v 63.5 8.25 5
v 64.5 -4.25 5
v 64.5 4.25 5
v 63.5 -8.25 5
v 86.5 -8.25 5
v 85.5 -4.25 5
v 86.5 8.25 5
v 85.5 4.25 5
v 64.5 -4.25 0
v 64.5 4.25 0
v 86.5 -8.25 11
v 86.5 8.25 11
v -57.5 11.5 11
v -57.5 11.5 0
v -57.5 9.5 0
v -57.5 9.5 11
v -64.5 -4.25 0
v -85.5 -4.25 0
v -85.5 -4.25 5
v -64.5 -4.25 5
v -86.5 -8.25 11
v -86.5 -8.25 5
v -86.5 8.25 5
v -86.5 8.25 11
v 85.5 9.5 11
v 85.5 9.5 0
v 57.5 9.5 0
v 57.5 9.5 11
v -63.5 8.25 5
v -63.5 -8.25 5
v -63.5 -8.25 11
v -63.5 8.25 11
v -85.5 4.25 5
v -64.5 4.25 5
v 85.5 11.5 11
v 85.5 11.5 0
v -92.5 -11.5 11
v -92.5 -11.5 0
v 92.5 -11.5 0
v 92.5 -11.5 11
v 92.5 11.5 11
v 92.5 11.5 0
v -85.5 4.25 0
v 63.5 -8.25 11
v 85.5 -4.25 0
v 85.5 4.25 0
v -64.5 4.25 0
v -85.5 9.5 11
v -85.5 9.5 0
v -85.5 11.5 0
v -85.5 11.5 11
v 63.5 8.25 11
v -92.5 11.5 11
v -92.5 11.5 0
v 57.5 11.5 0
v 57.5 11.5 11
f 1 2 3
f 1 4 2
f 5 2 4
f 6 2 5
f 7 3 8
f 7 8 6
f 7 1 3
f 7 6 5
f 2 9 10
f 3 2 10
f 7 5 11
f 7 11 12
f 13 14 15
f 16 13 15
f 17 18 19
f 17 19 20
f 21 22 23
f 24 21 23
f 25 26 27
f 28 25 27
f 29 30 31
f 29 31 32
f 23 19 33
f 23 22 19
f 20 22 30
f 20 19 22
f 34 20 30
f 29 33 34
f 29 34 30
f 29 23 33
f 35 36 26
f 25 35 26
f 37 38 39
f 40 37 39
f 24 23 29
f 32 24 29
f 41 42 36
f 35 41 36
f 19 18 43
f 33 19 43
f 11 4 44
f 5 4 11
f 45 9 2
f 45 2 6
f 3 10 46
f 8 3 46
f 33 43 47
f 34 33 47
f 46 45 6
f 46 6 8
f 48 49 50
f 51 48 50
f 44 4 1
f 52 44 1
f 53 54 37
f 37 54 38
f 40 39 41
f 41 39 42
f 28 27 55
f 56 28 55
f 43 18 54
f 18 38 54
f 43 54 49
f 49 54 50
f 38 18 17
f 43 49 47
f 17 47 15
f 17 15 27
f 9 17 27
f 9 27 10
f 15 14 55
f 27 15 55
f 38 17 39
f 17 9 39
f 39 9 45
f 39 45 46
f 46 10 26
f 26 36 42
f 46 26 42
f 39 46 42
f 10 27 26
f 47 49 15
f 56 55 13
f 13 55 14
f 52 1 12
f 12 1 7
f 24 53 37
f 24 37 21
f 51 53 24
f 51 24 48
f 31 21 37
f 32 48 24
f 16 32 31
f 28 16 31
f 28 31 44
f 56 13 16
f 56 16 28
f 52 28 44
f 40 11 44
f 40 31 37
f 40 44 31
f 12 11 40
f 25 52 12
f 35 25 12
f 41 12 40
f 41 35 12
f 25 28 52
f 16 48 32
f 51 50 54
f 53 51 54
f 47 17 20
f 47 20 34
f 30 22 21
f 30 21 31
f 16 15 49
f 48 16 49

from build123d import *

# Parameters (mm, degrees)
F0_W     = 23
F0_H     = 16.5
F1_DEPTH = 11
F0_W_2   = 21
F0_H_2   = 8.5
F2_DEPTH = 5


with BuildPart() as f1:
    # F0 (on Top) → F1 (new body)
    with BuildSketch(Plane.XY):
        Polygon((-85.5, 11.5), (-92.5, 11.5), (-92.5, -11.5), (92.5, -11.5), (92.5, 11.5), (85.5, 11.5), (85.5, 9.5), (57.5, 9.5), (57.5, 11.5), (-57.5, 11.5), (-57.5, 9.5), (-85.5, 9.5), align=None)
        with Locations((-75, 0)):
            Rectangle(F0_W, F0_H, mode=Mode.SUBTRACT)
        with Locations((75, 0)):
            Rectangle(F0_W, F0_H, mode=Mode.SUBTRACT)
    extrude(amount=F1_DEPTH)

    # F0 (on Top) → F2 (join)
    with BuildSketch(Plane.XY):
        Polygon((-85.5, 11.5), (-92.5, 11.5), (-92.5, -11.5), (92.5, -11.5), (92.5, 11.5), (85.5, 11.5), (85.5, 9.5), (57.5, 9.5), (57.5, 11.5), (-57.5, 11.5), (-57.5, 9.5), (-85.5, 9.5), align=None)
        with Locations((-75, 0)):
            Rectangle(F0_W, F0_H, mode=Mode.SUBTRACT)
        with Locations((75, 0)):
            Rectangle(F0_W, F0_H, mode=Mode.SUBTRACT)
        with Locations((75, 0)):
            Rectangle(F0_W, F0_H)
        with Locations((75, 0)):
            Rectangle(F0_W_2, F0_H_2, mode=Mode.SUBTRACT)
        with Locations((-75, 0)):
            Rectangle(F0_W, F0_H)
        with Locations((-75, 0)):
            Rectangle(F0_W_2, F0_H_2, mode=Mode.SUBTRACT)
    extrude(amount=F2_DEPTH)


solid = f1.part
